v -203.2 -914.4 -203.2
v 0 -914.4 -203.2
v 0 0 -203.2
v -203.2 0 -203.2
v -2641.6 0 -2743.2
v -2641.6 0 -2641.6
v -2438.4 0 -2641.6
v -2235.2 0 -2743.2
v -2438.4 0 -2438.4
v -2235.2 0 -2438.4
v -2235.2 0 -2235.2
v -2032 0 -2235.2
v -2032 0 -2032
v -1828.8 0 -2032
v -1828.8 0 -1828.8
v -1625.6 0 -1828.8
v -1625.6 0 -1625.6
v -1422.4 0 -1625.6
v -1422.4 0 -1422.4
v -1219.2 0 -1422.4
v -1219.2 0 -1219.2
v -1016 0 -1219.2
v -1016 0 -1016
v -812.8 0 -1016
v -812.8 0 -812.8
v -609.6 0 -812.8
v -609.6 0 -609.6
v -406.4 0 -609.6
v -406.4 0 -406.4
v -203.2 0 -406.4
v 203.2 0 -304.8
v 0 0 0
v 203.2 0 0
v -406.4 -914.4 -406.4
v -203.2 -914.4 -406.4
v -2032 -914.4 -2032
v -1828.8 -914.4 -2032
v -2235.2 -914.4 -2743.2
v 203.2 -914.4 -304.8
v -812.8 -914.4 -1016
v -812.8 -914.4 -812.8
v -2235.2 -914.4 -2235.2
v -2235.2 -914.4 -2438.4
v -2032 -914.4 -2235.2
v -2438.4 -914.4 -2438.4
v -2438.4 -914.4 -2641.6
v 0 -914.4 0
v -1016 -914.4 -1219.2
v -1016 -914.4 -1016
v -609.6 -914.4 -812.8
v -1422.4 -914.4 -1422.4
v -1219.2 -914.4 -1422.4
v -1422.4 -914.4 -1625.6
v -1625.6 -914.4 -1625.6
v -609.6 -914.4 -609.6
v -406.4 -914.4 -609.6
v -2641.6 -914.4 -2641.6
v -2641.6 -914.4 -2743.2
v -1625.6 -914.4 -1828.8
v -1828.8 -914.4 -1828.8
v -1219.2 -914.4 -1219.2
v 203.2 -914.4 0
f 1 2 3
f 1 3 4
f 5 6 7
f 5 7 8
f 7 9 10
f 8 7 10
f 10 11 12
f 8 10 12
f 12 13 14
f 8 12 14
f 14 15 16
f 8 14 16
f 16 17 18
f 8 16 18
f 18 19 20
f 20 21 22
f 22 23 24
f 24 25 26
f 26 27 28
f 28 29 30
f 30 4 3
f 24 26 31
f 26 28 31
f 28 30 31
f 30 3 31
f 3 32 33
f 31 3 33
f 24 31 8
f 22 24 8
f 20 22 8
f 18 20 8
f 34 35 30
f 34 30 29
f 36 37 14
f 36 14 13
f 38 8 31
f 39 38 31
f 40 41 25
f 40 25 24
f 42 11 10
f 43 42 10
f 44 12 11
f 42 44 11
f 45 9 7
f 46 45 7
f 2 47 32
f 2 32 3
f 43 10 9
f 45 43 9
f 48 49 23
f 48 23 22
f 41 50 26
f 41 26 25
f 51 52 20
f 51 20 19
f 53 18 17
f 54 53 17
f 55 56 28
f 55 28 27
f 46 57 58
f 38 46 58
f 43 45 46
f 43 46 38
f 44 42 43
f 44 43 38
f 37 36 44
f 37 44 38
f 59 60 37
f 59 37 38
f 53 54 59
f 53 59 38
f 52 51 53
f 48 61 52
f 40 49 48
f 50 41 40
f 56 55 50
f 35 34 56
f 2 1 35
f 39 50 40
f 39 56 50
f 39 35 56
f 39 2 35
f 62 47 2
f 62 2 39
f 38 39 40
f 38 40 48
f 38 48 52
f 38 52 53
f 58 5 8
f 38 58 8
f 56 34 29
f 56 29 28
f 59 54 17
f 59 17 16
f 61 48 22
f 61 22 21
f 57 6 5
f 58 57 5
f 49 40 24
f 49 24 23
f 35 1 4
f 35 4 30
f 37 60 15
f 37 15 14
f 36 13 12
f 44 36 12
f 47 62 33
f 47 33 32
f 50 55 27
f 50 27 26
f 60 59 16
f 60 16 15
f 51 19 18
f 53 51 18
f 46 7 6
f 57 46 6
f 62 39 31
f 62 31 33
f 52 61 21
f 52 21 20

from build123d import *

# Parameters (mm, degrees)
F1_DEPTH = 914.4


with BuildPart() as f1:
    # F0 (on Front) → F1 (new body)
    with BuildSketch(Plane.XZ):
        Polygon((203.2, 0), (0, 0), (0, -203.2), (-203.2, -203.2), (-203.2, -406.4), (-406.4, -406.4), (-406.4, -609.6), (-609.6, -609.6), (-609.6, -812.8), (-812.8, -812.8), (-812.8, -1016), (-1016, -1016), (-1016, -1219.2), (-1219.2, -1219.2), (-1219.2, -1422.4), (-1422.4, -1422.4), (-1422.4, -1625.6), (-1625.6, -1625.6), (-1625.6, -1828.8), (-1828.8, -1828.8), (-1828.8, -2032), (-2032, -2032), (-2032, -2235.2), (-2235.2, -2235.2), (-2235.2, -2438.4), (-2438.4, -2438.4), (-2438.4, -2641.6), (-2641.6, -2641.6), (-2641.6, -2743.2), (-2235.2, -2743.2), (203.2, -304.8), align=None)
    extrude(amount=F1_DEPTH)


solid = f1.part
